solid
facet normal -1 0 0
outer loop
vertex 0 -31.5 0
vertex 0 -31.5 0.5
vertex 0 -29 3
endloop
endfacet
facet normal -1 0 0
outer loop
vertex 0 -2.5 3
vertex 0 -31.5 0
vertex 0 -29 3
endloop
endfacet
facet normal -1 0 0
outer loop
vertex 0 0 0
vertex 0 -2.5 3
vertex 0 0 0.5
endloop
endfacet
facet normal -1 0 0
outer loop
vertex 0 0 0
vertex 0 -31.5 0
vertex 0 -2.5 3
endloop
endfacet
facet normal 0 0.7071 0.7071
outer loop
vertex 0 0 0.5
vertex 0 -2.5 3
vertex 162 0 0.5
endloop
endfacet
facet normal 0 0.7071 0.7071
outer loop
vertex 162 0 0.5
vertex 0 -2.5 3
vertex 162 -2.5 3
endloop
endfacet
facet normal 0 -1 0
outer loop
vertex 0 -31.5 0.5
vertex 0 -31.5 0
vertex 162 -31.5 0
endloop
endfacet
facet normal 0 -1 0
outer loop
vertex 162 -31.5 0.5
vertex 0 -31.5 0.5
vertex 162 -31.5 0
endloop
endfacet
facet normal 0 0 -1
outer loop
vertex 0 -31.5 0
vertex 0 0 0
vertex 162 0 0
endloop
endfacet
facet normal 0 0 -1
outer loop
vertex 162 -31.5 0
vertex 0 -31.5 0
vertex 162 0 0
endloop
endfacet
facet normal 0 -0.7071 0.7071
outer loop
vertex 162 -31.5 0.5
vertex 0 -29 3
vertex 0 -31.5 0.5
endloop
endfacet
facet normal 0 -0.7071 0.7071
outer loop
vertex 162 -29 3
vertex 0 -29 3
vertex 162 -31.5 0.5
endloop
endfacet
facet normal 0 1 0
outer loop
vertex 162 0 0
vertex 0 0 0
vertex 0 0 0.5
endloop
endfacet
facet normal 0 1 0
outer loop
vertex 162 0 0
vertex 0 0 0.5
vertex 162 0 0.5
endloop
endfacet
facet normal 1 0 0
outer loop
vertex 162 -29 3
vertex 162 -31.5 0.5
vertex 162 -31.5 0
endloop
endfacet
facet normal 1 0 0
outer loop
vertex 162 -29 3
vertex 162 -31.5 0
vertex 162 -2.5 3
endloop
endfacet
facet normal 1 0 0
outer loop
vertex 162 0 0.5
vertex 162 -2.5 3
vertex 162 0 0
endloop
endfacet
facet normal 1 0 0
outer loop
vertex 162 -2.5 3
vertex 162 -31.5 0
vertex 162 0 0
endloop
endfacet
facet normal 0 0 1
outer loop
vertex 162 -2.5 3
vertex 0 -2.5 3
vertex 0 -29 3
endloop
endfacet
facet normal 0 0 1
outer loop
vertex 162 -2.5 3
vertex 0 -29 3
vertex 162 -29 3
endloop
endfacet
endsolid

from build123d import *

# Parameters (mm, degrees)
SKETCH_W     = 162
SKETCH_H     = 31.5
PAD_DEPTH    = 3
CHAMFER_SIZE = 2.5


with BuildPart() as part:
    # Sketch → Pad (new body)
    with BuildSketch(Plane.XY):
        with Locations((81, -15.75)):
            Rectangle(SKETCH_W, SKETCH_H)
    extrude(amount=PAD_DEPTH)

    # Chamfer
    chamfer_edges = [part.edges().sort_by_distance(p)[0] for p in [
        (81, -31.5, 3),
        (81, 0, 3),
    ]]
    chamfer(chamfer_edges, length=CHAMFER_SIZE)


solid = part.part
